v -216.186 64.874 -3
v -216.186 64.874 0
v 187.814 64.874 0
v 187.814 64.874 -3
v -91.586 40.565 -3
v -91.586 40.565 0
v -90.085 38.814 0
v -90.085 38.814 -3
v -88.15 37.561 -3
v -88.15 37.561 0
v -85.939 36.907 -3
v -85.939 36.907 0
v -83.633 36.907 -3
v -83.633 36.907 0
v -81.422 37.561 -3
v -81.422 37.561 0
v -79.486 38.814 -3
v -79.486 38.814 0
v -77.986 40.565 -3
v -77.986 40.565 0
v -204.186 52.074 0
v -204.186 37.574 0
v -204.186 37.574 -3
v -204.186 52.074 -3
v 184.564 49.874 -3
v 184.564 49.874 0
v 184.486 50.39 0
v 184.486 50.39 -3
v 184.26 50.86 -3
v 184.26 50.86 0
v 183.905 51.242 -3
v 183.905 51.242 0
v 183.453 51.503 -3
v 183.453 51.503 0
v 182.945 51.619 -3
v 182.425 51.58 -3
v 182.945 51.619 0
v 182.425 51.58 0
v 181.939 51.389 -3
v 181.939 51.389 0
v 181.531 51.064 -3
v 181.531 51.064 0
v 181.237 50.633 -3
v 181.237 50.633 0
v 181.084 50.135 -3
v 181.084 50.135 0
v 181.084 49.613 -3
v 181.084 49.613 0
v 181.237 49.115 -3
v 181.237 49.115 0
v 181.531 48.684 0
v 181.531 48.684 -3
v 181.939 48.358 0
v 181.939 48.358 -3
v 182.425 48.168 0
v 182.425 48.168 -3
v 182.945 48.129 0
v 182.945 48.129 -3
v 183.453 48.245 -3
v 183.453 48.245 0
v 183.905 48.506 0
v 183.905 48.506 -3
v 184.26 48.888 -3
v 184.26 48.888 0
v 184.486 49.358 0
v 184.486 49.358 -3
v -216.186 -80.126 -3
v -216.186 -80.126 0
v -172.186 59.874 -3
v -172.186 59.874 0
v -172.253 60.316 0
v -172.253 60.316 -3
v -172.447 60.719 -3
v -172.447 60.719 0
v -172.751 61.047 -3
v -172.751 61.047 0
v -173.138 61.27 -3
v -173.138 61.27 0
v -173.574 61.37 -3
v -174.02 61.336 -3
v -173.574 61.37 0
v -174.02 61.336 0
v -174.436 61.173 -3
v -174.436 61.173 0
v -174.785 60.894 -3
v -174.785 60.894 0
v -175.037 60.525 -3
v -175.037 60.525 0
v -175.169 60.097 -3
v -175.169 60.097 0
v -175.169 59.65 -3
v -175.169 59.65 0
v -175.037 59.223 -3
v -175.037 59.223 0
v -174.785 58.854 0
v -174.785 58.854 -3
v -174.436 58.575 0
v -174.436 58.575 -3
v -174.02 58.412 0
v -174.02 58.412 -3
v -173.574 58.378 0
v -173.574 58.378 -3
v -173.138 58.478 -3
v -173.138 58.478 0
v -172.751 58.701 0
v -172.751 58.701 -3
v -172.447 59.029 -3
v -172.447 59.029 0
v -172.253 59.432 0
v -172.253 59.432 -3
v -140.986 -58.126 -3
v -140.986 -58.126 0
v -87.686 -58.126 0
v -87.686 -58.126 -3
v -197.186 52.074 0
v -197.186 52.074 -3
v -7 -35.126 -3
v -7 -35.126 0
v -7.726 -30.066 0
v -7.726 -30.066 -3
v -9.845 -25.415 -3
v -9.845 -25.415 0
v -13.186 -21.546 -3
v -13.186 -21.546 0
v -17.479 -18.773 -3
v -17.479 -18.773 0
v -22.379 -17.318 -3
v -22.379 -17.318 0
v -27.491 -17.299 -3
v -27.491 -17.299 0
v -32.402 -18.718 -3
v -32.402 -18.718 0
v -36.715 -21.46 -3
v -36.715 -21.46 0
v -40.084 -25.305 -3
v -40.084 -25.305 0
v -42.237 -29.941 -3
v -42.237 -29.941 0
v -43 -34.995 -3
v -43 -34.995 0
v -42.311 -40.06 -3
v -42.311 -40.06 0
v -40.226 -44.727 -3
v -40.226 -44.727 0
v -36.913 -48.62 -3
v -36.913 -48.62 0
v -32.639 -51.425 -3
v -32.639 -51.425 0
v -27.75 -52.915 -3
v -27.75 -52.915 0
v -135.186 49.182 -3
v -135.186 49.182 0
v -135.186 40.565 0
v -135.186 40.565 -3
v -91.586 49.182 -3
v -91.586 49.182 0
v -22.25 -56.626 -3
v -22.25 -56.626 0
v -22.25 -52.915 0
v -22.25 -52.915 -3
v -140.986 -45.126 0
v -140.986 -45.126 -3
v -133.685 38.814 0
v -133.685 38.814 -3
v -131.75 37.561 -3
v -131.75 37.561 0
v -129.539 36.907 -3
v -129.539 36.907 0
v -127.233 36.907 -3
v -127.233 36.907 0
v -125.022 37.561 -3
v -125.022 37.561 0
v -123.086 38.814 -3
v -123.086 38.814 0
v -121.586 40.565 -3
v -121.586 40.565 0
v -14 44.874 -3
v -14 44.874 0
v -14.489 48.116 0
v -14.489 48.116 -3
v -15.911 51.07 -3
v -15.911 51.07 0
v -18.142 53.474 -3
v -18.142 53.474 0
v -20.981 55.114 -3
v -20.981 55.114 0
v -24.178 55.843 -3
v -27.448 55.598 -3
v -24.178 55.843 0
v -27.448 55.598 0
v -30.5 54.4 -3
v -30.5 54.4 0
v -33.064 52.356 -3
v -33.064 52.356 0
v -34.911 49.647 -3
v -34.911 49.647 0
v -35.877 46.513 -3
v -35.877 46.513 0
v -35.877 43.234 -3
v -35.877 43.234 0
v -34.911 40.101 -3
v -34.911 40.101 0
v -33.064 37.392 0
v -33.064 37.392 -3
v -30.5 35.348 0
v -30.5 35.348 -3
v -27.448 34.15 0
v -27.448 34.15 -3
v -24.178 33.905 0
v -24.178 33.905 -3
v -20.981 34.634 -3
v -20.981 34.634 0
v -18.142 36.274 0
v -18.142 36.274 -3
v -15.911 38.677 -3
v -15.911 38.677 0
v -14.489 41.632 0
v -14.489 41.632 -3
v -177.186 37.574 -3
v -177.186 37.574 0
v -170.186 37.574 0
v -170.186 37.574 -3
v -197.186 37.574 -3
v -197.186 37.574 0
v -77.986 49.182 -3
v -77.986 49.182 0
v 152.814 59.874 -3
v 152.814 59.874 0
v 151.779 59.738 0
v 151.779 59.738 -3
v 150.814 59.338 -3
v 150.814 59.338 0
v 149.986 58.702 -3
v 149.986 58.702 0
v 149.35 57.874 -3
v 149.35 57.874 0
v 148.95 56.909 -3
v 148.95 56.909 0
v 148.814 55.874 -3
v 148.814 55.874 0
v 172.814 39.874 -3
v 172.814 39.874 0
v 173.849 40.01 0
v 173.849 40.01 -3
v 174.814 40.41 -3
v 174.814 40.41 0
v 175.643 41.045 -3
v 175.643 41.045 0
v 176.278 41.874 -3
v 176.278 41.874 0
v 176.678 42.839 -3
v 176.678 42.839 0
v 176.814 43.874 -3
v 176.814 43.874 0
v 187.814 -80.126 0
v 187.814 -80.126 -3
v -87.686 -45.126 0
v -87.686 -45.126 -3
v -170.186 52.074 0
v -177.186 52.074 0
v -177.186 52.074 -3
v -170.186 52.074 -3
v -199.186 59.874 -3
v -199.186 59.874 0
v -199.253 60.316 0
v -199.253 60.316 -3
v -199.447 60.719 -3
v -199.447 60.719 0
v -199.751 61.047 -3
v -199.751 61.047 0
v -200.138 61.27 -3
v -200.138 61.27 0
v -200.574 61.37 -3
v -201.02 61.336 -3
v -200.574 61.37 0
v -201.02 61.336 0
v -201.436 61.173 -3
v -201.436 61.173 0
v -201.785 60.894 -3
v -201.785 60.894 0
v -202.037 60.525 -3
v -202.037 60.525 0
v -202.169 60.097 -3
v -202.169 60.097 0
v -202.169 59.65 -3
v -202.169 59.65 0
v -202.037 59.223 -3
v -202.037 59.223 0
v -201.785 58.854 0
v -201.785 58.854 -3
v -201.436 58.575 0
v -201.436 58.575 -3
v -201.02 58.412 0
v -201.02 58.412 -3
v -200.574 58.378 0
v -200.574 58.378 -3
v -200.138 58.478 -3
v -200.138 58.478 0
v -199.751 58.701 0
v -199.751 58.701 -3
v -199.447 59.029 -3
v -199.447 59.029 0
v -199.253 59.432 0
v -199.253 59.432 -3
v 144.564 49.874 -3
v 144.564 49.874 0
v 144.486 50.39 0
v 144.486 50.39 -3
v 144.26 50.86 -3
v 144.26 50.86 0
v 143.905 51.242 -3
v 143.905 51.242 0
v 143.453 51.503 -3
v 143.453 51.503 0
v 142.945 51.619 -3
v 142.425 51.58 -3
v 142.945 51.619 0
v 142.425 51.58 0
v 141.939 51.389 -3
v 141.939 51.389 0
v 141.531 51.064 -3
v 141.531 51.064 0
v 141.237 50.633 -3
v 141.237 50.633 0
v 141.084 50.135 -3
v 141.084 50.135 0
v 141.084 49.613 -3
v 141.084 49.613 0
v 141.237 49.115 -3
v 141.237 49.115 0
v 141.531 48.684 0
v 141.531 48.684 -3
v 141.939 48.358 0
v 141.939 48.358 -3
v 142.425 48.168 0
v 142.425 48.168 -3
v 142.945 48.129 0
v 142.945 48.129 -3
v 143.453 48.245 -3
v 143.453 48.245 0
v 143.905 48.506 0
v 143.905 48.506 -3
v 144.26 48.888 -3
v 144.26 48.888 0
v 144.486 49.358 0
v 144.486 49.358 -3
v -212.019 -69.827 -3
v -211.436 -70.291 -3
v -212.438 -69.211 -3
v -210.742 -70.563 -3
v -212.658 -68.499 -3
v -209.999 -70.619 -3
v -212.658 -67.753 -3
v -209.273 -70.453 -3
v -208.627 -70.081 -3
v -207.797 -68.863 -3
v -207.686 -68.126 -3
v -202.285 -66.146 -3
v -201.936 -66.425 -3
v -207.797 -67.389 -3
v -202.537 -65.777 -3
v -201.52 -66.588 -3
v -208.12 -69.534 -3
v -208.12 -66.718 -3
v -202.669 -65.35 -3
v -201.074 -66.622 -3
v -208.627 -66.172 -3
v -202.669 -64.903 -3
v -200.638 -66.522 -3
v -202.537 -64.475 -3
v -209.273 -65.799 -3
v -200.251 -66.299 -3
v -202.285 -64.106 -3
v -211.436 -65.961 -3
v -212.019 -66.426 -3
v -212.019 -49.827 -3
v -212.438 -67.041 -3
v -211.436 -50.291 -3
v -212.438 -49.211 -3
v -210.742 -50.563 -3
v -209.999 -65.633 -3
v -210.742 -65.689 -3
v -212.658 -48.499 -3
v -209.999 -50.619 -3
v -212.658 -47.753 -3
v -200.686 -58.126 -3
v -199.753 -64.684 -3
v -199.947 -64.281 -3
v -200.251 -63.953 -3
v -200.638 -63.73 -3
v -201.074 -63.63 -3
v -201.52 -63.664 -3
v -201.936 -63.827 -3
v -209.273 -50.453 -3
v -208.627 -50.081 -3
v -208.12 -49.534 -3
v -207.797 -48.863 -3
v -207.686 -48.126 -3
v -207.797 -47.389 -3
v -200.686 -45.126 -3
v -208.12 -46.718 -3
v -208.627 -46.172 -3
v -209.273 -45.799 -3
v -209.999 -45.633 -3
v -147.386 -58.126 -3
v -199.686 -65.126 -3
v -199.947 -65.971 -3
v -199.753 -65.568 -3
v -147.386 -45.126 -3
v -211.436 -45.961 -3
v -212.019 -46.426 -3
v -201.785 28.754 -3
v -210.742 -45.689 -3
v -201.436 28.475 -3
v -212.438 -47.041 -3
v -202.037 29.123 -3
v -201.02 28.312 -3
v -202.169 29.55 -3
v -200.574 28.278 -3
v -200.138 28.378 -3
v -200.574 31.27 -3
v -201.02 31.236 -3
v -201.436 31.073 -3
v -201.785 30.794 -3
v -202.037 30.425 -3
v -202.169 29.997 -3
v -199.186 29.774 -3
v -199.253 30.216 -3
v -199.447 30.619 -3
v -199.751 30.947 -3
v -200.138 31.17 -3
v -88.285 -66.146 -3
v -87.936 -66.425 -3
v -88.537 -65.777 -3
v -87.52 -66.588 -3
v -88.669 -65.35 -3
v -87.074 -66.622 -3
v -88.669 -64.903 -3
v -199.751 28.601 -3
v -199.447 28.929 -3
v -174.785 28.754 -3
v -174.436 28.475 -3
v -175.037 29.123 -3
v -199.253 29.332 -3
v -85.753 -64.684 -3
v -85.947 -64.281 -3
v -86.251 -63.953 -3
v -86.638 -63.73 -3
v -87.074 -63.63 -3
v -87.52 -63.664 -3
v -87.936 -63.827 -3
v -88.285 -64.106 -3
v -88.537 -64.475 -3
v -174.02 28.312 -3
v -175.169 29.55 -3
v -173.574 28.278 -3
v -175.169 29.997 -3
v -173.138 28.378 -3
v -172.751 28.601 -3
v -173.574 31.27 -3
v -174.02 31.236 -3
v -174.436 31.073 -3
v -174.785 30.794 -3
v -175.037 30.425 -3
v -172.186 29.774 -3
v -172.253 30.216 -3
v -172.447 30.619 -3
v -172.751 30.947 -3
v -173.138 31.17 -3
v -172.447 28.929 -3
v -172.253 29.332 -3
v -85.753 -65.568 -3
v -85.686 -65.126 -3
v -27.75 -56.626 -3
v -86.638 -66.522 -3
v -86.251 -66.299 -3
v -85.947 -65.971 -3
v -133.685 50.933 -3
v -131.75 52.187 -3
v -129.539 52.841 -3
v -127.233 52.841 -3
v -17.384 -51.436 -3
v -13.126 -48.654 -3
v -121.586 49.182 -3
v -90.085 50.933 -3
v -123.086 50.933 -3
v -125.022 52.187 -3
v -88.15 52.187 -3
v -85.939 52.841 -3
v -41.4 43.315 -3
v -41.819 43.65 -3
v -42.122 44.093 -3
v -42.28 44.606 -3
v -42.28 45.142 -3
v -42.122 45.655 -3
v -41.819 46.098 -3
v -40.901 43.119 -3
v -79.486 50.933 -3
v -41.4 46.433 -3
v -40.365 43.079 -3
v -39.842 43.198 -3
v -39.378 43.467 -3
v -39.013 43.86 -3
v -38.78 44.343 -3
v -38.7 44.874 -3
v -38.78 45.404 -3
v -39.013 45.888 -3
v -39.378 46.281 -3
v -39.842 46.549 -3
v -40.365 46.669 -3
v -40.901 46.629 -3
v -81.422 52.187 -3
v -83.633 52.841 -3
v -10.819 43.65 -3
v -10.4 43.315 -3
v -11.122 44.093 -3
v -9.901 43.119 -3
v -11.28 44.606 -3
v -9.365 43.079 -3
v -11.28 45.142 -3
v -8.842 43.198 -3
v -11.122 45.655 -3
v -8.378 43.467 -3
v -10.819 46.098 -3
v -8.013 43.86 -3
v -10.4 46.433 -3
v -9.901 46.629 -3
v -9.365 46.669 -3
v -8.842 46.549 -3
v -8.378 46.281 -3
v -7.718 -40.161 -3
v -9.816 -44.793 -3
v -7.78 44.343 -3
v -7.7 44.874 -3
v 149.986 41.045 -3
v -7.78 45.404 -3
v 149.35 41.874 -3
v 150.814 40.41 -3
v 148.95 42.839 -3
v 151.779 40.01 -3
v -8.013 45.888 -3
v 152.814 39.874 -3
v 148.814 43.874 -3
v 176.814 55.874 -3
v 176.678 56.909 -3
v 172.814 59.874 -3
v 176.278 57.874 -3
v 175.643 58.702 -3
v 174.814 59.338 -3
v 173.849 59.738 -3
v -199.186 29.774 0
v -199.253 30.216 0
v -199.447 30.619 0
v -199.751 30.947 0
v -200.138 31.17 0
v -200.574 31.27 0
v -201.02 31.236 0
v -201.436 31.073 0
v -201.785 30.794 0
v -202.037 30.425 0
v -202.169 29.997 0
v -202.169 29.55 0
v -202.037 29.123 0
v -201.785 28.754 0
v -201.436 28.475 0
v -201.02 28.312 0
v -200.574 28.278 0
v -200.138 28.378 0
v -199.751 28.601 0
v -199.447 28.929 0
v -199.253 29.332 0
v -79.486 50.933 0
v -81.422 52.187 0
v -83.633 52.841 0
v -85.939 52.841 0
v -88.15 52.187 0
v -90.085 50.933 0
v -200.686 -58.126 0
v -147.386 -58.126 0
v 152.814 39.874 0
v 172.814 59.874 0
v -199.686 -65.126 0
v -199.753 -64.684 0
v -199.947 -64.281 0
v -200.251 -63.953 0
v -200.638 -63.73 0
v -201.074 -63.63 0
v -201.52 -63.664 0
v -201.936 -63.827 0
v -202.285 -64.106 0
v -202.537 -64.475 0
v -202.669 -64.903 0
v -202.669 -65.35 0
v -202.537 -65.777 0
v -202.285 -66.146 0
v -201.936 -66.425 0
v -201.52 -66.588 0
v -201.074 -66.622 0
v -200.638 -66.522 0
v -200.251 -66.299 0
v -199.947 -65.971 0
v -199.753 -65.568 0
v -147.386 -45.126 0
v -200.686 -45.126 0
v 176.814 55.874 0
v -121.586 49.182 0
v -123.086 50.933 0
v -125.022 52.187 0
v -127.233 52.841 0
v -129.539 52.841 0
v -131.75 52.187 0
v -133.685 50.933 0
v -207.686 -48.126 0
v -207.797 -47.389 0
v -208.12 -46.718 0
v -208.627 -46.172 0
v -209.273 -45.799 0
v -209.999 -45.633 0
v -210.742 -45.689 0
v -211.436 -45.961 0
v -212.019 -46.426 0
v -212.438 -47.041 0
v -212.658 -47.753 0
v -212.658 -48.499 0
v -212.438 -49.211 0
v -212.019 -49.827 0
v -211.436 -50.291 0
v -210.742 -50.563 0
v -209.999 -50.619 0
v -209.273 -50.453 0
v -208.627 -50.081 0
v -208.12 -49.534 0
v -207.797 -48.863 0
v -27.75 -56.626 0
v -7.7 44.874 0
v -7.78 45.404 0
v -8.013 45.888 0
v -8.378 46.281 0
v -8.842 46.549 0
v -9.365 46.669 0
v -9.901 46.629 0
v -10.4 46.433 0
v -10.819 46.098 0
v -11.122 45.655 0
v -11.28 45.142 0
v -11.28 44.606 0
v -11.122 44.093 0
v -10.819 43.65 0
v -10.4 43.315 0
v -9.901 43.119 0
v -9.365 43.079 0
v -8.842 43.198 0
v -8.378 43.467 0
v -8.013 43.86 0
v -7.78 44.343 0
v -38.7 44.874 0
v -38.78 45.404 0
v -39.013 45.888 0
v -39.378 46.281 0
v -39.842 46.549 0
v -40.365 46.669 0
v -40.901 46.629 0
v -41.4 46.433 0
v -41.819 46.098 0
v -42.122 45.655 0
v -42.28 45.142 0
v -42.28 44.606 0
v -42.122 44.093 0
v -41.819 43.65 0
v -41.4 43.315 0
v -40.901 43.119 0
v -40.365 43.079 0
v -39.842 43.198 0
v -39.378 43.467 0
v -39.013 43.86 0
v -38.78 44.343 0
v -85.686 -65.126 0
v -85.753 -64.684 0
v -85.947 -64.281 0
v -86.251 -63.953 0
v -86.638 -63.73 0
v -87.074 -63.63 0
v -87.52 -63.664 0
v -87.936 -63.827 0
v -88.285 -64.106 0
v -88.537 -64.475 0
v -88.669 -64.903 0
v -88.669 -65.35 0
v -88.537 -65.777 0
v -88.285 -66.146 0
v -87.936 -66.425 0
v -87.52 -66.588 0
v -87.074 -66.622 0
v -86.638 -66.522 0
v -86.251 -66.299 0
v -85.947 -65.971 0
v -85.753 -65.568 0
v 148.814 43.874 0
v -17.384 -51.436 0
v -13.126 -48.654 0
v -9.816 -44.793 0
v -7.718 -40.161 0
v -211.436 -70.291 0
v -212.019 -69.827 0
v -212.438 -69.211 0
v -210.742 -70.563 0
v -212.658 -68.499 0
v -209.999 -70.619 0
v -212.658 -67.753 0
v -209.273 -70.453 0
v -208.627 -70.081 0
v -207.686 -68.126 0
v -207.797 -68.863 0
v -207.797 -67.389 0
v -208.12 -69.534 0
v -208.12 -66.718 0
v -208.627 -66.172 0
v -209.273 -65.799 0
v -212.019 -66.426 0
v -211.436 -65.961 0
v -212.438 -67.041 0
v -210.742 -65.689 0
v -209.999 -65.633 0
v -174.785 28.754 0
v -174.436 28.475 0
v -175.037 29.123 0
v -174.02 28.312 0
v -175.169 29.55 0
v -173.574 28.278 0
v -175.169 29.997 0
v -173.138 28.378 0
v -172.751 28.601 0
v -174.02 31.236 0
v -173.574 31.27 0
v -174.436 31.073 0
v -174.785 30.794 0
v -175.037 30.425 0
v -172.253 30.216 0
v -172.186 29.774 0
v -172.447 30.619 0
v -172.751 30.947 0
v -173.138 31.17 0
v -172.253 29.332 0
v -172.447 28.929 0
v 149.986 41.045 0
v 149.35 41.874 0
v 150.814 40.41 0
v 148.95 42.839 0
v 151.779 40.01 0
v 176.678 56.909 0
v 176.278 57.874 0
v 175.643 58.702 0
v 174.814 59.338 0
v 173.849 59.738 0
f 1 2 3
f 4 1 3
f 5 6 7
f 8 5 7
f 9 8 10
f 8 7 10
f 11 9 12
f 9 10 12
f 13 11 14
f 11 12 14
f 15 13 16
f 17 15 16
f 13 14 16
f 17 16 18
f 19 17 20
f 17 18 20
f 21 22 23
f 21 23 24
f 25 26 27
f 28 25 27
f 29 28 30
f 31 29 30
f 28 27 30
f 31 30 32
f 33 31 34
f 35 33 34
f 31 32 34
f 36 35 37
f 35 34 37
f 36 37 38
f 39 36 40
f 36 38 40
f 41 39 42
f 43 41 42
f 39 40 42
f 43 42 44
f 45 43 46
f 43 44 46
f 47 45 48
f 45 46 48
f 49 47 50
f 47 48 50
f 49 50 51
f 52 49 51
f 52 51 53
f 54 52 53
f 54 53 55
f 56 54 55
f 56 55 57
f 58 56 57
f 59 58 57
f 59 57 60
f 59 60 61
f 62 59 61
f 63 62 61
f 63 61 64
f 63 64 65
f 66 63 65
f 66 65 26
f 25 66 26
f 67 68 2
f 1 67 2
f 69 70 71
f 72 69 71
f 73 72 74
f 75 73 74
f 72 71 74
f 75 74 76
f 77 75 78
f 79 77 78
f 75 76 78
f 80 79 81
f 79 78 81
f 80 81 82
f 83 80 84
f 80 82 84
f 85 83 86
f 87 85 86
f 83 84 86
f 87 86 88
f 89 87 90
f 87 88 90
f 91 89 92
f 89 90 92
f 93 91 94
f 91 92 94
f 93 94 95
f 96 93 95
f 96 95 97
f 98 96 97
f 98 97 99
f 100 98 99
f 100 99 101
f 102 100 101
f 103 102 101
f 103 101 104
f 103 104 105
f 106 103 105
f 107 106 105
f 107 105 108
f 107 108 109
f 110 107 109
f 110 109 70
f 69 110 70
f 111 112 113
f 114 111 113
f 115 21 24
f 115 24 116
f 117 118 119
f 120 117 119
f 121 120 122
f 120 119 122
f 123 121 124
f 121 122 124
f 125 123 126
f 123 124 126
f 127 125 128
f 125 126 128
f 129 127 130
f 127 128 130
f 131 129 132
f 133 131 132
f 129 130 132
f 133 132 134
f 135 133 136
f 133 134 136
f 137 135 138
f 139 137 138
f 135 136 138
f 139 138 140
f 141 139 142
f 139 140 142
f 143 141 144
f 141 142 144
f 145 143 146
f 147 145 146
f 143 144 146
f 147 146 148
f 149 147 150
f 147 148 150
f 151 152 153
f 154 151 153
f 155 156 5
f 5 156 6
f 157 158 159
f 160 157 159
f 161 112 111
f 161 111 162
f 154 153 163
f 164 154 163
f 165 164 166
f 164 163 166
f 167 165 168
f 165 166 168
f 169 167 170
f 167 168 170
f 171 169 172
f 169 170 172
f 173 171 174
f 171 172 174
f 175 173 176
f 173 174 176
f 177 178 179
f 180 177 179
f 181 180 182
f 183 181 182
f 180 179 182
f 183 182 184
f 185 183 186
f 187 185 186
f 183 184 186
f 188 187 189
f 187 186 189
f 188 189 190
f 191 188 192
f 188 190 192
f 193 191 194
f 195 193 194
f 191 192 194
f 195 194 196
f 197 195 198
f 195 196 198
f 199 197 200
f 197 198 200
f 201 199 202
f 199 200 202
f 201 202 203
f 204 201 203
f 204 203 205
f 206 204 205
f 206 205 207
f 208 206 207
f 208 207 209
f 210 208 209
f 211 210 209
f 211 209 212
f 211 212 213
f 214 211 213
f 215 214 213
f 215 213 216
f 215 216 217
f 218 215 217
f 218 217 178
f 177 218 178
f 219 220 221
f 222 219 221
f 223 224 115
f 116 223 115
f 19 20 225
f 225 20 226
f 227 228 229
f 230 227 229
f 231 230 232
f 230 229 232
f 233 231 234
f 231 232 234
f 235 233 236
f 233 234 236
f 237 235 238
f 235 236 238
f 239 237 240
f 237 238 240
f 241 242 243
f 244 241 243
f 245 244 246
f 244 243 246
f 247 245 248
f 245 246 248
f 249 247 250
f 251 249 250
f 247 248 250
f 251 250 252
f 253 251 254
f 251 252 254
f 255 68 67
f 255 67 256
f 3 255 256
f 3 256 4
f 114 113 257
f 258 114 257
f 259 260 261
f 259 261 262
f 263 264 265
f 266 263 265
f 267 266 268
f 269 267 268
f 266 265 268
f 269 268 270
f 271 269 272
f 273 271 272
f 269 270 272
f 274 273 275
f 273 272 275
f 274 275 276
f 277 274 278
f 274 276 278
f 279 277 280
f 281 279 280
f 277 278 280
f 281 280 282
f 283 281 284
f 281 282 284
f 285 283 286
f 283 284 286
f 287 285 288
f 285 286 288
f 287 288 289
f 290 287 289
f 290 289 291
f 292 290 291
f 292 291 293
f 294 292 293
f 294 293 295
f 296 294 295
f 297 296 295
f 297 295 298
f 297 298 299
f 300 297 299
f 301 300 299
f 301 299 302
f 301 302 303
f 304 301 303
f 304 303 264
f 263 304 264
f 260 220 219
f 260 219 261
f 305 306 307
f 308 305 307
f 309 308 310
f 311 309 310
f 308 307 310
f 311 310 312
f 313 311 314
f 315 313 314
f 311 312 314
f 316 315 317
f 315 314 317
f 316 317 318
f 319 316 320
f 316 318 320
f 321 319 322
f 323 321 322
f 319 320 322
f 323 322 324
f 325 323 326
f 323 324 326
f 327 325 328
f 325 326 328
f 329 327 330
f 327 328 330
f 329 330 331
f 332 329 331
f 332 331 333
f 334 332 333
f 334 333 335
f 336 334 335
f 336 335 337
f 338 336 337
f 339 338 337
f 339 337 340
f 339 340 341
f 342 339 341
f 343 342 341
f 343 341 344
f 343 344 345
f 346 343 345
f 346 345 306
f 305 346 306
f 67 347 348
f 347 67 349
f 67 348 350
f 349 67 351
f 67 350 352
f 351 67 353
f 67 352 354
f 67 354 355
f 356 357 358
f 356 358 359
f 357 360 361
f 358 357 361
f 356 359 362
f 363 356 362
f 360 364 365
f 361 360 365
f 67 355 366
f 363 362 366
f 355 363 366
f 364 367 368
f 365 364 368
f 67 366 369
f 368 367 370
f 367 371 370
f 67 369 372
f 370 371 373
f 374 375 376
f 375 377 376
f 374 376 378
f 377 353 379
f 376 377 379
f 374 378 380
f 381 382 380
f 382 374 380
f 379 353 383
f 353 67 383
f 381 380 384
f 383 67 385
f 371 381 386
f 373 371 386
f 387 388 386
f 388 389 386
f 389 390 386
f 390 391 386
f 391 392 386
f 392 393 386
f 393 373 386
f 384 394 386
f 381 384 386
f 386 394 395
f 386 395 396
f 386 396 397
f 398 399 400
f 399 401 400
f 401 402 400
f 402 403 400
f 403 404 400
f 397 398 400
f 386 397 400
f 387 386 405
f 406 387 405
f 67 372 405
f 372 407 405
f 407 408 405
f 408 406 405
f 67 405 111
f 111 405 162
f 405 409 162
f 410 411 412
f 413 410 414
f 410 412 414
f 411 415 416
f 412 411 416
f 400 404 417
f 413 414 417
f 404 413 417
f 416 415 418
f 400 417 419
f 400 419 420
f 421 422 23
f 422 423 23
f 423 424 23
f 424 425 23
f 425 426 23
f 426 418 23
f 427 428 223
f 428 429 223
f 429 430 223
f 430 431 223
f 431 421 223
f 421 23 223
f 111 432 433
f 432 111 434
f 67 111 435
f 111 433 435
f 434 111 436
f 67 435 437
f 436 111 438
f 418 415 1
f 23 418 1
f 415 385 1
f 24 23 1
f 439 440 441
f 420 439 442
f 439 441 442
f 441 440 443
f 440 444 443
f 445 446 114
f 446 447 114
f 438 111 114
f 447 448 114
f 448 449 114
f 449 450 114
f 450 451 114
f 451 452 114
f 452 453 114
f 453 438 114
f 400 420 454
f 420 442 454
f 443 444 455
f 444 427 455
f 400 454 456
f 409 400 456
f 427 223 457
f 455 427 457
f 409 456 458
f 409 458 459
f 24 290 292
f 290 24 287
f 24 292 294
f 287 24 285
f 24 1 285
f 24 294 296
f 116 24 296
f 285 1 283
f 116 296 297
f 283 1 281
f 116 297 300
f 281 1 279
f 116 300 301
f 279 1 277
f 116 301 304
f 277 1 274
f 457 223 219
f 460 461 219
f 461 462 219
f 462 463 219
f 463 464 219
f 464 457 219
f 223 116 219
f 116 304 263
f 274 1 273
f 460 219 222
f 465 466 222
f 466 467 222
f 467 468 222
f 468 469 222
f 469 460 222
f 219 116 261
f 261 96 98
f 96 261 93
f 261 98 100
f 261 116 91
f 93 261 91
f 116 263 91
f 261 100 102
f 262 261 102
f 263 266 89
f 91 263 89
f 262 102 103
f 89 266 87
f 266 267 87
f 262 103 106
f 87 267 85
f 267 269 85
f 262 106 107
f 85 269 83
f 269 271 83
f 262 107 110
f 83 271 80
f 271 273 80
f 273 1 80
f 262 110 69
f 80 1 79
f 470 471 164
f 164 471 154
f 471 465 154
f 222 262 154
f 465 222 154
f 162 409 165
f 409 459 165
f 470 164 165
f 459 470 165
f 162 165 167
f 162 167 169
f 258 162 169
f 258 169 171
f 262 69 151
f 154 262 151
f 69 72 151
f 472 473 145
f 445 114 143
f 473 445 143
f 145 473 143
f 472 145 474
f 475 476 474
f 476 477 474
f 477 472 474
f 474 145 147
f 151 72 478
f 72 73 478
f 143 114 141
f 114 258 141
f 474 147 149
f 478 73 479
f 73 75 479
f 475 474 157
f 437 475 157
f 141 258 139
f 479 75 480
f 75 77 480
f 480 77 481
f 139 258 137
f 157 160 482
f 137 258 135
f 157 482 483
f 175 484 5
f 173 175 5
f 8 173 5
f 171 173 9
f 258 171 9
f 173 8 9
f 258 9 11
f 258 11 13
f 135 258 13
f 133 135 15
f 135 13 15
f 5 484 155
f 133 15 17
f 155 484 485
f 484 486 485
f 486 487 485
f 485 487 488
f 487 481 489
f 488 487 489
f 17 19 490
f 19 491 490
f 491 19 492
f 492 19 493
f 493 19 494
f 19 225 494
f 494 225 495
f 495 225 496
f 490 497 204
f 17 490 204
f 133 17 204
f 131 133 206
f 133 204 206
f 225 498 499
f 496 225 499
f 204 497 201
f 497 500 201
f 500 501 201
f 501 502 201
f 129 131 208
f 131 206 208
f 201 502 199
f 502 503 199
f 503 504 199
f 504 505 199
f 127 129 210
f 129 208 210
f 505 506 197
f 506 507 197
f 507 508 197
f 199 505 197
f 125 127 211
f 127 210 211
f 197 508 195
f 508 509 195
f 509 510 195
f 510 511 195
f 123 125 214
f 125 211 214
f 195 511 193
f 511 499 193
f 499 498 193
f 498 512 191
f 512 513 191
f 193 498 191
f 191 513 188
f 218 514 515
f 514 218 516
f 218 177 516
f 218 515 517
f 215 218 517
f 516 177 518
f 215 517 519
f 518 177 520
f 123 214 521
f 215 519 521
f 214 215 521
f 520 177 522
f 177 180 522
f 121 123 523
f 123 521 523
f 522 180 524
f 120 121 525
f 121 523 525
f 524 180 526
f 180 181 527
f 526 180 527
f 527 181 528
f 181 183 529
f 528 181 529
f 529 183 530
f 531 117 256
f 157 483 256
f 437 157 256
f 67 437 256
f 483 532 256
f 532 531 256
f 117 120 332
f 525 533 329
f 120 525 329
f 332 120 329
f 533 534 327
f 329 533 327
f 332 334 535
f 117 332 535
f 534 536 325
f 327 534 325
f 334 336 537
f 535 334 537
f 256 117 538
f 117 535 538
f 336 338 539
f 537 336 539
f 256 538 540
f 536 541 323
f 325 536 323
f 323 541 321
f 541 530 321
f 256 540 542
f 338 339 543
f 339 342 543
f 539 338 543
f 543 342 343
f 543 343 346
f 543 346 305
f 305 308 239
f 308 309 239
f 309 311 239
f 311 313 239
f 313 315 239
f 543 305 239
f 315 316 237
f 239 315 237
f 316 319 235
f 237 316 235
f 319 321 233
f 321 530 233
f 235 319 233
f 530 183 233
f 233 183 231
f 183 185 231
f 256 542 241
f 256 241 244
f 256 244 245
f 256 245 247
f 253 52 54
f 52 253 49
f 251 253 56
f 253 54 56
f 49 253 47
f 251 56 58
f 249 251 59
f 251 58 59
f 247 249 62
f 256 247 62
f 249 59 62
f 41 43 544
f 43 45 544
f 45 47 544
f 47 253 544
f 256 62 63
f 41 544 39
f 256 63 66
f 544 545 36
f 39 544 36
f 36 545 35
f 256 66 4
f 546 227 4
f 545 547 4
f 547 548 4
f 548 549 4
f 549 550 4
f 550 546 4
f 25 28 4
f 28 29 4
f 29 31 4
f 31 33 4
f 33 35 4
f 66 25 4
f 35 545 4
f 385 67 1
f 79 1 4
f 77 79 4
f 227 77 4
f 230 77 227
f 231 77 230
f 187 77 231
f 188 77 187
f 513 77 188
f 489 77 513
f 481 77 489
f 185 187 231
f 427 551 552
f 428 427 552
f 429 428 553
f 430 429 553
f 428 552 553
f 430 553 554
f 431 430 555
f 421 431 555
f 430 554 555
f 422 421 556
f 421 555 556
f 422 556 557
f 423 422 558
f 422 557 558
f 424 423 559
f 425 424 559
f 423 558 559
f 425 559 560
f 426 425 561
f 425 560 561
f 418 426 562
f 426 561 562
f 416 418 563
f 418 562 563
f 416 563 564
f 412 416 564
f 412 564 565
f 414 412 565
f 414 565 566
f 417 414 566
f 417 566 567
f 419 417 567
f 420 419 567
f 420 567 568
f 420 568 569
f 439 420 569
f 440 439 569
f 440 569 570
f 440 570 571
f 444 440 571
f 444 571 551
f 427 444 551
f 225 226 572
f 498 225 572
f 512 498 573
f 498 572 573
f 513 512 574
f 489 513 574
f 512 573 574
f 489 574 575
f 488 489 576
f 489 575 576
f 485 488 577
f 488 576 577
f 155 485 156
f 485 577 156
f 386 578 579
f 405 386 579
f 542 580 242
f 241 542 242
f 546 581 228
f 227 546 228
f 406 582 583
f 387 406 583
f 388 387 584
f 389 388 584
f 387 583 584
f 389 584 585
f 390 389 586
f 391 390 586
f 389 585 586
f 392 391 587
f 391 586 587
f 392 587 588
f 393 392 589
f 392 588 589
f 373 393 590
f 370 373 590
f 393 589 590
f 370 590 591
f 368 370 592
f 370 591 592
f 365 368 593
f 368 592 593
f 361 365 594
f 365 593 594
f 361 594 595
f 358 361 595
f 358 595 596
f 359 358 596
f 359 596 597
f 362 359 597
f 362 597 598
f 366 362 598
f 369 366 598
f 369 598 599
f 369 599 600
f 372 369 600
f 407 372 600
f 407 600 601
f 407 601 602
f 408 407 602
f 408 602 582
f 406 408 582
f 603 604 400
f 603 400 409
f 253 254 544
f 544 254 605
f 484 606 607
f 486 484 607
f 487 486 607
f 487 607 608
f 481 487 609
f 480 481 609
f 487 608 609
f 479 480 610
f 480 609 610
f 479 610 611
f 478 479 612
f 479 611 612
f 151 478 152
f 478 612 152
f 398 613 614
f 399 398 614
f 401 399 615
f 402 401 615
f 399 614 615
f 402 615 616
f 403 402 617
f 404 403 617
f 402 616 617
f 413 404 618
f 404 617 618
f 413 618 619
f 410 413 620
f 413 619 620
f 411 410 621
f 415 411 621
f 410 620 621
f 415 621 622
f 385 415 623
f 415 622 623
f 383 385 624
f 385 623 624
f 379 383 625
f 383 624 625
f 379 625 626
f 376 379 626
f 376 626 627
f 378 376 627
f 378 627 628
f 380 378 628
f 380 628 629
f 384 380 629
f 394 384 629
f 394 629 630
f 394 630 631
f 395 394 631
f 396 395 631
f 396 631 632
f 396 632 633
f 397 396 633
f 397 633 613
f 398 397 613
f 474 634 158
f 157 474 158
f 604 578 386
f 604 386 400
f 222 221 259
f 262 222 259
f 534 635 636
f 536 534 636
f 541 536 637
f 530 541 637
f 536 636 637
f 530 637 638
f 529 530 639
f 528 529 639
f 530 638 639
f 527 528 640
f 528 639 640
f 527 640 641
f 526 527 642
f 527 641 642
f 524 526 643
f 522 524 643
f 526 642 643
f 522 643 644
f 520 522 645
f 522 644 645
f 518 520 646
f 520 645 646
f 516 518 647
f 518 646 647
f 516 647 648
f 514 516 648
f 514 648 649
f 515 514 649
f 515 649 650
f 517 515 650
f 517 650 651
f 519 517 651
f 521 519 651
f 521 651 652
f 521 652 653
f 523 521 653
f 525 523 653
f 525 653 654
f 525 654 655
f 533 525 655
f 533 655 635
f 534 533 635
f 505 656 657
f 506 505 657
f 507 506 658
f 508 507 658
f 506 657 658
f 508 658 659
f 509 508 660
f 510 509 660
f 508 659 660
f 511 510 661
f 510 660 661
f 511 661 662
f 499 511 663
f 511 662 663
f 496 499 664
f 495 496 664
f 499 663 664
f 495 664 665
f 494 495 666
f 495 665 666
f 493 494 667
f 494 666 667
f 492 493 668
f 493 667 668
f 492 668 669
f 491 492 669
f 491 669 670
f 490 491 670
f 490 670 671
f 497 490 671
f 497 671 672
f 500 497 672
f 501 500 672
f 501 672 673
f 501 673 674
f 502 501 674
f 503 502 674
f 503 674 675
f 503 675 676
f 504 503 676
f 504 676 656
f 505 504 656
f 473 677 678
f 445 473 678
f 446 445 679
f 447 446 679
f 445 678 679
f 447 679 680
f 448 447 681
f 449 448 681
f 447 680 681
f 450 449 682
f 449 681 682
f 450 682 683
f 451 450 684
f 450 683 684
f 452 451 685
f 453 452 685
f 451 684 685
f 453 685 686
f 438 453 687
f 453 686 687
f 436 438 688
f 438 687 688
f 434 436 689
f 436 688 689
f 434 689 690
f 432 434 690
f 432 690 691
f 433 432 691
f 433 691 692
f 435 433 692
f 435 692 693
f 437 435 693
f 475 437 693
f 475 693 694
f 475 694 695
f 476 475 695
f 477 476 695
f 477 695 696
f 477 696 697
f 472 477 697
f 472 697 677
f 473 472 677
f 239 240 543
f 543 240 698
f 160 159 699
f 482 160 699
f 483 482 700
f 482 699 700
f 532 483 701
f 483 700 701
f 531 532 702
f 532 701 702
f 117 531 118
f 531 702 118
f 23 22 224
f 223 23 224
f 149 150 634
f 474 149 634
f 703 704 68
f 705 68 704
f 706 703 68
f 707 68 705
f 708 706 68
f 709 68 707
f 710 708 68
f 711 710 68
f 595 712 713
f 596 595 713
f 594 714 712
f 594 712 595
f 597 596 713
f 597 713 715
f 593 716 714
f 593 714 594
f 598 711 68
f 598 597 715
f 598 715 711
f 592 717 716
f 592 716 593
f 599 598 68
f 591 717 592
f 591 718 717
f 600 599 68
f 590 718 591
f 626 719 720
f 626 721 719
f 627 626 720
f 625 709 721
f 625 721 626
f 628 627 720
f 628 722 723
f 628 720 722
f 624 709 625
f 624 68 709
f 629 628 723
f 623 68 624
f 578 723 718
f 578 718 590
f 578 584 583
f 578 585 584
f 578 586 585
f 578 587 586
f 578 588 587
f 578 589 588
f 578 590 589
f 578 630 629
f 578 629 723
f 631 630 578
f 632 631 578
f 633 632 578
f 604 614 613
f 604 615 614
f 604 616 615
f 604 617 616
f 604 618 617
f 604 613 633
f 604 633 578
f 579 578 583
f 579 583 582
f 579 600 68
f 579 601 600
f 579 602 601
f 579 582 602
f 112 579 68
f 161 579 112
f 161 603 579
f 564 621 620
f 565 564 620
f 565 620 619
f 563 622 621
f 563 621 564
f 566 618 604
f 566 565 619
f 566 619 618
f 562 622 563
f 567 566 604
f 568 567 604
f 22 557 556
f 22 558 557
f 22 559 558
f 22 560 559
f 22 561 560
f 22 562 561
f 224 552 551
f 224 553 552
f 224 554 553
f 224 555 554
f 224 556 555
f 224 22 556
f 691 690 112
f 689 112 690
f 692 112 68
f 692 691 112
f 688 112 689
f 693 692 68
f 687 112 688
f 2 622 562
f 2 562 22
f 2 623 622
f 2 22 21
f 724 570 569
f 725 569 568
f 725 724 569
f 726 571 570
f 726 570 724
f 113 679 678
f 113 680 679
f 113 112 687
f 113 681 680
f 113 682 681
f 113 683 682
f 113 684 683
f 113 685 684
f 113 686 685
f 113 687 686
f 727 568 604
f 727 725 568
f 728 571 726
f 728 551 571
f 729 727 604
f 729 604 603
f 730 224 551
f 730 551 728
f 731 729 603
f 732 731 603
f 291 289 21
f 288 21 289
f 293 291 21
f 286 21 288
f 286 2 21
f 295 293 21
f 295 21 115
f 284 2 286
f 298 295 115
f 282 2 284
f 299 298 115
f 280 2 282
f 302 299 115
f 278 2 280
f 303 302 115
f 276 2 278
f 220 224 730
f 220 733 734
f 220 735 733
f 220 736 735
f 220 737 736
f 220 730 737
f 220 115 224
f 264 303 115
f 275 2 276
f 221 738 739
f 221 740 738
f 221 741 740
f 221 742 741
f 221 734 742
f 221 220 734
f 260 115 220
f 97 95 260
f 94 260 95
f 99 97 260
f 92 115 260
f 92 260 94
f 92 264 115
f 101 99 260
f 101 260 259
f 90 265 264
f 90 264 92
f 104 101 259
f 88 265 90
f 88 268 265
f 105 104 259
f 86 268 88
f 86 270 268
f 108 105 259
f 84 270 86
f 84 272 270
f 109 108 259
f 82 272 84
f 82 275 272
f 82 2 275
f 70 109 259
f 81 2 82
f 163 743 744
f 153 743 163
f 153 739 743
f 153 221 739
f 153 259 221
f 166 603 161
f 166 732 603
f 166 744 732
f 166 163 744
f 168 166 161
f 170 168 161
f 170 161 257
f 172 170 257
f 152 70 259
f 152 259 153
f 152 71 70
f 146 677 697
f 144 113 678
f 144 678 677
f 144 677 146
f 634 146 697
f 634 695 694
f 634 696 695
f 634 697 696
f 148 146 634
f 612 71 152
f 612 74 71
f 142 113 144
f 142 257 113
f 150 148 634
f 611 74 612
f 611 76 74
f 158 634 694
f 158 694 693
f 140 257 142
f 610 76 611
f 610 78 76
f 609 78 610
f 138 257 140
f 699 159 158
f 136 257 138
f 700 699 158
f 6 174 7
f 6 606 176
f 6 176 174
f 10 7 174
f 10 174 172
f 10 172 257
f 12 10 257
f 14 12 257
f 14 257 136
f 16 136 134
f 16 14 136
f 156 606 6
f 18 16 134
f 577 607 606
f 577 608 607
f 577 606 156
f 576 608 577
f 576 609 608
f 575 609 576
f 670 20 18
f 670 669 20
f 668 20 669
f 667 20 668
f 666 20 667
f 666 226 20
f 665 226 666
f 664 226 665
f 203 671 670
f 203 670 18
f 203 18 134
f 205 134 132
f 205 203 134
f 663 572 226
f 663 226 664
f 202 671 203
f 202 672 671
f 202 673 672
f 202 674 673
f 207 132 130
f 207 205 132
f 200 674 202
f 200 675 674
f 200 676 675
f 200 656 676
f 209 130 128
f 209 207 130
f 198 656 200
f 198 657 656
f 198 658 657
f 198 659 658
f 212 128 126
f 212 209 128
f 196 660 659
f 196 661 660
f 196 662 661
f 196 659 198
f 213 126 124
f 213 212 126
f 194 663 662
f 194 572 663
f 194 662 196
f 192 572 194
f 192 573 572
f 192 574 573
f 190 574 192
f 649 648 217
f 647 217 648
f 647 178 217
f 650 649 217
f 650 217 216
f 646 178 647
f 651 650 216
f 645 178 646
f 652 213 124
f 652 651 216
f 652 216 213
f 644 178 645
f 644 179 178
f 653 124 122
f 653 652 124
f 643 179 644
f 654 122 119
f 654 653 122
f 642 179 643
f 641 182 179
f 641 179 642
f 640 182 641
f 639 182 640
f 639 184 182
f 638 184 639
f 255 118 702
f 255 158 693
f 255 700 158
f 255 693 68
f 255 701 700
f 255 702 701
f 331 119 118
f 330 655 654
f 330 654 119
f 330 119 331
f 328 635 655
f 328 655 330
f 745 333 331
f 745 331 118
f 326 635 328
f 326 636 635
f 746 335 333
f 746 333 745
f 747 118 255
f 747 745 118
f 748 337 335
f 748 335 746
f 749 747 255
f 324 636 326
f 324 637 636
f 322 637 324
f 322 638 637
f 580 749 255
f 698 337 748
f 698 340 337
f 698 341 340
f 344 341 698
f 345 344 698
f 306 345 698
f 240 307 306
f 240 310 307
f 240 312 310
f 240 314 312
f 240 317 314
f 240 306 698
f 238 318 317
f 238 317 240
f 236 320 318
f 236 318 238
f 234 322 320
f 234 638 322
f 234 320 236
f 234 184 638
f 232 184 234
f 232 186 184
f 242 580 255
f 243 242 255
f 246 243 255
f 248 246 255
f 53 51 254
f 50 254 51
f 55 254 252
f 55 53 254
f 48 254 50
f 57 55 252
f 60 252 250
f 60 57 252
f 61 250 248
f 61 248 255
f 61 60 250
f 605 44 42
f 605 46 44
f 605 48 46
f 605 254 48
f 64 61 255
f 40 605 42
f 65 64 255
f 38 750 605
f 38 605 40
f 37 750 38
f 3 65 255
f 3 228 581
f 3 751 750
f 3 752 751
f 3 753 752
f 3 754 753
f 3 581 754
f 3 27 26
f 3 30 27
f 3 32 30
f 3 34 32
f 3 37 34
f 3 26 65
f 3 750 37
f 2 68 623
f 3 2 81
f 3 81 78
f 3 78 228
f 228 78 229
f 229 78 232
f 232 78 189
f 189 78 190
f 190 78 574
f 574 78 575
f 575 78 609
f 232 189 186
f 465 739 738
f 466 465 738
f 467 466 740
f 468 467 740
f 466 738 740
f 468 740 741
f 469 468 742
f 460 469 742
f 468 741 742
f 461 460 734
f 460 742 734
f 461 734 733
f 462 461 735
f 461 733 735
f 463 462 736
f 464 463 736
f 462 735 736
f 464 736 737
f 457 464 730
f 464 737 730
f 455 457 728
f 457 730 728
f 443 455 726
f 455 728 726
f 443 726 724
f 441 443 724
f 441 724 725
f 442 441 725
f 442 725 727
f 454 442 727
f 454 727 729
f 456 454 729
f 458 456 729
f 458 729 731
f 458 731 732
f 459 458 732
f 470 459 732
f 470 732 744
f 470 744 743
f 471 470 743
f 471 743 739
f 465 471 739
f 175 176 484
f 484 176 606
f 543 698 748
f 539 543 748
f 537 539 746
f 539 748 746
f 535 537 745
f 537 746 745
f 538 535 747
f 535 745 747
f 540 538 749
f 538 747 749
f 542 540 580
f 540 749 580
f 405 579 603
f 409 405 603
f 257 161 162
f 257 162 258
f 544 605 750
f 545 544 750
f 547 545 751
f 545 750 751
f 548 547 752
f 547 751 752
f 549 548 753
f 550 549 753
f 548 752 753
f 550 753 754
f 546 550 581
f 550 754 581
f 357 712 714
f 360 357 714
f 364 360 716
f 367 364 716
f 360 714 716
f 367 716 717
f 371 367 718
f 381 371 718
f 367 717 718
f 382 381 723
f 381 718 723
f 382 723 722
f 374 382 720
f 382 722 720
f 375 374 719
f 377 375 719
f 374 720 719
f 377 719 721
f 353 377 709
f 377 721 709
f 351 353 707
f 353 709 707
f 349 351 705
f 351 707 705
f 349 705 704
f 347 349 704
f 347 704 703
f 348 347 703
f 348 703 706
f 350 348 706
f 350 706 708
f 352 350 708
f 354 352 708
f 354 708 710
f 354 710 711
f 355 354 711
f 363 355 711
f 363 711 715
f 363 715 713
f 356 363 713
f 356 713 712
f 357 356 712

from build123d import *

# Parameters (mm, degrees)
F0_W     = 404
F0_H     = 145
F2_DEPTH = 3
F1_R     = 2.5
F1_R_2   = 11
F1_R_3   = 1.8
F1_R_4   = 1.75
F1_W     = 53.3
F1_H     = 13
F1_W_2   = 7
F1_H_2   = 14.5
F1_R_5   = 1.5
F3_DEPTH = 25


with BuildPart() as f2:
    # F0 (on Top) → F2 (new body)
    with BuildSketch(Plane.XY):
        with Locations((-14.1859020234, -7.6260944492)):
            Rectangle(F0_W, F0_H)
    extrude(amount=-F2_DEPTH)

    # F1 (on Top) → F3 (cut)
    with BuildSketch(Plane.XY):
        with Locations((-210.1859020234, -68.1260944492)):
            Circle(F1_R)
        with BuildLine():
            Line((-135.1859020234, 49.1823275357), (-135.1859020234, 40.5654835659))
            ThreePointArc((-135.1859020234, 40.5654835659), (-128.3859020234, 36.8239055508), (-121.5859020234, 40.5654835659))
            Line((-121.5859020234, 40.5654835659), (-121.5859020234, 49.1823275357))
            ThreePointArc((-121.5859020234, 49.1823275357), (-128.3859020234, 52.9239055508), (-135.1859020234, 49.1823275357))
        make_face()
        with BuildLine():
            ThreePointArc((-22.25, -52.9147846764), (-11.3343496313, -46.8414689631), (-7, -35.1260944492))
            ThreePointArc((-7, -35.1260944492), (-36.7153745139, -21.4604440805), (-27.75, -52.9147846764))
            Line((-27.75, -52.9147846764), (-27.75, -31.4030106551))
            Line((-27.75, -31.4030106551), (-22.25, -31.4030106551))
            Line((-22.25, -31.4030106551), (-22.25, -52.9147846764))
        make_face()
        with BuildLine():
            Line((-27.75, -31.4030106551), (-27.75, -52.9147846764))
            ThreePointArc((-27.75, -52.9147846764), (-25, -53.1260944492), (-22.25, -52.9147846764))
            Line((-22.25, -52.9147846764), (-22.25, -31.4030106551))
            Line((-22.25, -31.4030106551), (-27.75, -31.4030106551))
        make_face()
        with BuildLine():
            ThreePointArc((-22.25, -52.9147846764), (-25, -53.1260944492), (-27.75, -52.9147846764))
            Line((-27.75, -52.9147846764), (-27.75, -56.6260944492))
            Line((-27.75, -56.6260944492), (-22.25, -56.6260944492))
            Line((-22.25, -56.6260944492), (-22.25, -52.9147846764))
        make_face()
        with Locations((-25, 44.8739055508)):
            Circle(F1_R_2)
        with Locations((-40.5, 44.8739055508)):
            Circle(F1_R_3)
        with Locations((-9.5, 44.8739055508)):
            Circle(F1_R_3)
        with Locations((-210.1859020234, -48.1260944492)):
            Circle(F1_R)
        with BuildLine():
            Line((152.8140979766, 39.8739055508), (172.8140979766, 39.8739055508))
            ThreePointArc((172.8140979766, 39.8739055508), (175.6425251014, 41.045478426), (176.8140979766, 43.8739055508))
            Line((176.8140979766, 43.8739055508), (176.8140979766, 55.8739055508))
            ThreePointArc((176.8140979766, 55.8739055508), (175.6425251014, 58.7023326755), (172.8140979766, 59.8739055508))
            Line((172.8140979766, 59.8739055508), (152.8140979766, 59.8739055508))
            ThreePointArc((152.8140979766, 59.8739055508), (149.9856708519, 58.7023326755), (148.8140979766, 55.8739055508))
            Line((148.8140979766, 55.8739055508), (148.8140979766, 43.8739055508))
            ThreePointArc((148.8140979766, 43.8739055508), (149.9856708519, 41.045478426), (152.8140979766, 39.8739055508))
        make_face()
        with Locations((142.8140979766, 49.8739055508)):
            Circle(F1_R_4)
        with Locations((182.8140979766, 49.8739055508)):
            Circle(F1_R_4)
        with Locations((-174.0359020234, -51.6260944492)):
            Rectangle(F1_W, F1_H)
        with Locations((-114.3359020234, -51.6260944492)):
            Rectangle(F1_W, F1_H)
        with Locations((-200.6859020234, 44.8239055508)):
            Rectangle(F1_W_2, F1_H_2)
        with Locations((-200.6859020234, 59.8739055508)):
            Circle(F1_R_5)
        with Locations((-200.6859020234, 29.7739055508)):
            Circle(F1_R_5)
        with Locations((-173.6859020234, 44.8239055508)):
            Rectangle(F1_W_2, F1_H_2)
        with Locations((-173.6859020234, 59.8739055508)):
            Circle(F1_R_5)
        with Locations((-173.6859020234, 29.7739055508)):
            Circle(F1_R_5)
        with BuildLine():
            Line((-91.5859020234, 49.1823275357), (-91.5859020234, 40.5654835659))
            ThreePointArc((-91.5859020234, 40.5654835659), (-84.7859020234, 36.8239055508), (-77.9859020234, 40.5654835659))
            Line((-77.9859020234, 40.5654835659), (-77.9859020234, 49.1823275357))
            ThreePointArc((-77.9859020234, 49.1823275357), (-84.7859020234, 52.9239055508), (-91.5859020234, 49.1823275357))
        make_face()
        with Locations((-201.1859020234, -65.1260944492)):
            Circle(F1_R_5)
        with Locations((-87.1859020234, -65.1260944492)):
            Circle(F1_R_5)
    extrude(amount=-F3_DEPTH, mode=Mode.SUBTRACT)


solid = f2.part
